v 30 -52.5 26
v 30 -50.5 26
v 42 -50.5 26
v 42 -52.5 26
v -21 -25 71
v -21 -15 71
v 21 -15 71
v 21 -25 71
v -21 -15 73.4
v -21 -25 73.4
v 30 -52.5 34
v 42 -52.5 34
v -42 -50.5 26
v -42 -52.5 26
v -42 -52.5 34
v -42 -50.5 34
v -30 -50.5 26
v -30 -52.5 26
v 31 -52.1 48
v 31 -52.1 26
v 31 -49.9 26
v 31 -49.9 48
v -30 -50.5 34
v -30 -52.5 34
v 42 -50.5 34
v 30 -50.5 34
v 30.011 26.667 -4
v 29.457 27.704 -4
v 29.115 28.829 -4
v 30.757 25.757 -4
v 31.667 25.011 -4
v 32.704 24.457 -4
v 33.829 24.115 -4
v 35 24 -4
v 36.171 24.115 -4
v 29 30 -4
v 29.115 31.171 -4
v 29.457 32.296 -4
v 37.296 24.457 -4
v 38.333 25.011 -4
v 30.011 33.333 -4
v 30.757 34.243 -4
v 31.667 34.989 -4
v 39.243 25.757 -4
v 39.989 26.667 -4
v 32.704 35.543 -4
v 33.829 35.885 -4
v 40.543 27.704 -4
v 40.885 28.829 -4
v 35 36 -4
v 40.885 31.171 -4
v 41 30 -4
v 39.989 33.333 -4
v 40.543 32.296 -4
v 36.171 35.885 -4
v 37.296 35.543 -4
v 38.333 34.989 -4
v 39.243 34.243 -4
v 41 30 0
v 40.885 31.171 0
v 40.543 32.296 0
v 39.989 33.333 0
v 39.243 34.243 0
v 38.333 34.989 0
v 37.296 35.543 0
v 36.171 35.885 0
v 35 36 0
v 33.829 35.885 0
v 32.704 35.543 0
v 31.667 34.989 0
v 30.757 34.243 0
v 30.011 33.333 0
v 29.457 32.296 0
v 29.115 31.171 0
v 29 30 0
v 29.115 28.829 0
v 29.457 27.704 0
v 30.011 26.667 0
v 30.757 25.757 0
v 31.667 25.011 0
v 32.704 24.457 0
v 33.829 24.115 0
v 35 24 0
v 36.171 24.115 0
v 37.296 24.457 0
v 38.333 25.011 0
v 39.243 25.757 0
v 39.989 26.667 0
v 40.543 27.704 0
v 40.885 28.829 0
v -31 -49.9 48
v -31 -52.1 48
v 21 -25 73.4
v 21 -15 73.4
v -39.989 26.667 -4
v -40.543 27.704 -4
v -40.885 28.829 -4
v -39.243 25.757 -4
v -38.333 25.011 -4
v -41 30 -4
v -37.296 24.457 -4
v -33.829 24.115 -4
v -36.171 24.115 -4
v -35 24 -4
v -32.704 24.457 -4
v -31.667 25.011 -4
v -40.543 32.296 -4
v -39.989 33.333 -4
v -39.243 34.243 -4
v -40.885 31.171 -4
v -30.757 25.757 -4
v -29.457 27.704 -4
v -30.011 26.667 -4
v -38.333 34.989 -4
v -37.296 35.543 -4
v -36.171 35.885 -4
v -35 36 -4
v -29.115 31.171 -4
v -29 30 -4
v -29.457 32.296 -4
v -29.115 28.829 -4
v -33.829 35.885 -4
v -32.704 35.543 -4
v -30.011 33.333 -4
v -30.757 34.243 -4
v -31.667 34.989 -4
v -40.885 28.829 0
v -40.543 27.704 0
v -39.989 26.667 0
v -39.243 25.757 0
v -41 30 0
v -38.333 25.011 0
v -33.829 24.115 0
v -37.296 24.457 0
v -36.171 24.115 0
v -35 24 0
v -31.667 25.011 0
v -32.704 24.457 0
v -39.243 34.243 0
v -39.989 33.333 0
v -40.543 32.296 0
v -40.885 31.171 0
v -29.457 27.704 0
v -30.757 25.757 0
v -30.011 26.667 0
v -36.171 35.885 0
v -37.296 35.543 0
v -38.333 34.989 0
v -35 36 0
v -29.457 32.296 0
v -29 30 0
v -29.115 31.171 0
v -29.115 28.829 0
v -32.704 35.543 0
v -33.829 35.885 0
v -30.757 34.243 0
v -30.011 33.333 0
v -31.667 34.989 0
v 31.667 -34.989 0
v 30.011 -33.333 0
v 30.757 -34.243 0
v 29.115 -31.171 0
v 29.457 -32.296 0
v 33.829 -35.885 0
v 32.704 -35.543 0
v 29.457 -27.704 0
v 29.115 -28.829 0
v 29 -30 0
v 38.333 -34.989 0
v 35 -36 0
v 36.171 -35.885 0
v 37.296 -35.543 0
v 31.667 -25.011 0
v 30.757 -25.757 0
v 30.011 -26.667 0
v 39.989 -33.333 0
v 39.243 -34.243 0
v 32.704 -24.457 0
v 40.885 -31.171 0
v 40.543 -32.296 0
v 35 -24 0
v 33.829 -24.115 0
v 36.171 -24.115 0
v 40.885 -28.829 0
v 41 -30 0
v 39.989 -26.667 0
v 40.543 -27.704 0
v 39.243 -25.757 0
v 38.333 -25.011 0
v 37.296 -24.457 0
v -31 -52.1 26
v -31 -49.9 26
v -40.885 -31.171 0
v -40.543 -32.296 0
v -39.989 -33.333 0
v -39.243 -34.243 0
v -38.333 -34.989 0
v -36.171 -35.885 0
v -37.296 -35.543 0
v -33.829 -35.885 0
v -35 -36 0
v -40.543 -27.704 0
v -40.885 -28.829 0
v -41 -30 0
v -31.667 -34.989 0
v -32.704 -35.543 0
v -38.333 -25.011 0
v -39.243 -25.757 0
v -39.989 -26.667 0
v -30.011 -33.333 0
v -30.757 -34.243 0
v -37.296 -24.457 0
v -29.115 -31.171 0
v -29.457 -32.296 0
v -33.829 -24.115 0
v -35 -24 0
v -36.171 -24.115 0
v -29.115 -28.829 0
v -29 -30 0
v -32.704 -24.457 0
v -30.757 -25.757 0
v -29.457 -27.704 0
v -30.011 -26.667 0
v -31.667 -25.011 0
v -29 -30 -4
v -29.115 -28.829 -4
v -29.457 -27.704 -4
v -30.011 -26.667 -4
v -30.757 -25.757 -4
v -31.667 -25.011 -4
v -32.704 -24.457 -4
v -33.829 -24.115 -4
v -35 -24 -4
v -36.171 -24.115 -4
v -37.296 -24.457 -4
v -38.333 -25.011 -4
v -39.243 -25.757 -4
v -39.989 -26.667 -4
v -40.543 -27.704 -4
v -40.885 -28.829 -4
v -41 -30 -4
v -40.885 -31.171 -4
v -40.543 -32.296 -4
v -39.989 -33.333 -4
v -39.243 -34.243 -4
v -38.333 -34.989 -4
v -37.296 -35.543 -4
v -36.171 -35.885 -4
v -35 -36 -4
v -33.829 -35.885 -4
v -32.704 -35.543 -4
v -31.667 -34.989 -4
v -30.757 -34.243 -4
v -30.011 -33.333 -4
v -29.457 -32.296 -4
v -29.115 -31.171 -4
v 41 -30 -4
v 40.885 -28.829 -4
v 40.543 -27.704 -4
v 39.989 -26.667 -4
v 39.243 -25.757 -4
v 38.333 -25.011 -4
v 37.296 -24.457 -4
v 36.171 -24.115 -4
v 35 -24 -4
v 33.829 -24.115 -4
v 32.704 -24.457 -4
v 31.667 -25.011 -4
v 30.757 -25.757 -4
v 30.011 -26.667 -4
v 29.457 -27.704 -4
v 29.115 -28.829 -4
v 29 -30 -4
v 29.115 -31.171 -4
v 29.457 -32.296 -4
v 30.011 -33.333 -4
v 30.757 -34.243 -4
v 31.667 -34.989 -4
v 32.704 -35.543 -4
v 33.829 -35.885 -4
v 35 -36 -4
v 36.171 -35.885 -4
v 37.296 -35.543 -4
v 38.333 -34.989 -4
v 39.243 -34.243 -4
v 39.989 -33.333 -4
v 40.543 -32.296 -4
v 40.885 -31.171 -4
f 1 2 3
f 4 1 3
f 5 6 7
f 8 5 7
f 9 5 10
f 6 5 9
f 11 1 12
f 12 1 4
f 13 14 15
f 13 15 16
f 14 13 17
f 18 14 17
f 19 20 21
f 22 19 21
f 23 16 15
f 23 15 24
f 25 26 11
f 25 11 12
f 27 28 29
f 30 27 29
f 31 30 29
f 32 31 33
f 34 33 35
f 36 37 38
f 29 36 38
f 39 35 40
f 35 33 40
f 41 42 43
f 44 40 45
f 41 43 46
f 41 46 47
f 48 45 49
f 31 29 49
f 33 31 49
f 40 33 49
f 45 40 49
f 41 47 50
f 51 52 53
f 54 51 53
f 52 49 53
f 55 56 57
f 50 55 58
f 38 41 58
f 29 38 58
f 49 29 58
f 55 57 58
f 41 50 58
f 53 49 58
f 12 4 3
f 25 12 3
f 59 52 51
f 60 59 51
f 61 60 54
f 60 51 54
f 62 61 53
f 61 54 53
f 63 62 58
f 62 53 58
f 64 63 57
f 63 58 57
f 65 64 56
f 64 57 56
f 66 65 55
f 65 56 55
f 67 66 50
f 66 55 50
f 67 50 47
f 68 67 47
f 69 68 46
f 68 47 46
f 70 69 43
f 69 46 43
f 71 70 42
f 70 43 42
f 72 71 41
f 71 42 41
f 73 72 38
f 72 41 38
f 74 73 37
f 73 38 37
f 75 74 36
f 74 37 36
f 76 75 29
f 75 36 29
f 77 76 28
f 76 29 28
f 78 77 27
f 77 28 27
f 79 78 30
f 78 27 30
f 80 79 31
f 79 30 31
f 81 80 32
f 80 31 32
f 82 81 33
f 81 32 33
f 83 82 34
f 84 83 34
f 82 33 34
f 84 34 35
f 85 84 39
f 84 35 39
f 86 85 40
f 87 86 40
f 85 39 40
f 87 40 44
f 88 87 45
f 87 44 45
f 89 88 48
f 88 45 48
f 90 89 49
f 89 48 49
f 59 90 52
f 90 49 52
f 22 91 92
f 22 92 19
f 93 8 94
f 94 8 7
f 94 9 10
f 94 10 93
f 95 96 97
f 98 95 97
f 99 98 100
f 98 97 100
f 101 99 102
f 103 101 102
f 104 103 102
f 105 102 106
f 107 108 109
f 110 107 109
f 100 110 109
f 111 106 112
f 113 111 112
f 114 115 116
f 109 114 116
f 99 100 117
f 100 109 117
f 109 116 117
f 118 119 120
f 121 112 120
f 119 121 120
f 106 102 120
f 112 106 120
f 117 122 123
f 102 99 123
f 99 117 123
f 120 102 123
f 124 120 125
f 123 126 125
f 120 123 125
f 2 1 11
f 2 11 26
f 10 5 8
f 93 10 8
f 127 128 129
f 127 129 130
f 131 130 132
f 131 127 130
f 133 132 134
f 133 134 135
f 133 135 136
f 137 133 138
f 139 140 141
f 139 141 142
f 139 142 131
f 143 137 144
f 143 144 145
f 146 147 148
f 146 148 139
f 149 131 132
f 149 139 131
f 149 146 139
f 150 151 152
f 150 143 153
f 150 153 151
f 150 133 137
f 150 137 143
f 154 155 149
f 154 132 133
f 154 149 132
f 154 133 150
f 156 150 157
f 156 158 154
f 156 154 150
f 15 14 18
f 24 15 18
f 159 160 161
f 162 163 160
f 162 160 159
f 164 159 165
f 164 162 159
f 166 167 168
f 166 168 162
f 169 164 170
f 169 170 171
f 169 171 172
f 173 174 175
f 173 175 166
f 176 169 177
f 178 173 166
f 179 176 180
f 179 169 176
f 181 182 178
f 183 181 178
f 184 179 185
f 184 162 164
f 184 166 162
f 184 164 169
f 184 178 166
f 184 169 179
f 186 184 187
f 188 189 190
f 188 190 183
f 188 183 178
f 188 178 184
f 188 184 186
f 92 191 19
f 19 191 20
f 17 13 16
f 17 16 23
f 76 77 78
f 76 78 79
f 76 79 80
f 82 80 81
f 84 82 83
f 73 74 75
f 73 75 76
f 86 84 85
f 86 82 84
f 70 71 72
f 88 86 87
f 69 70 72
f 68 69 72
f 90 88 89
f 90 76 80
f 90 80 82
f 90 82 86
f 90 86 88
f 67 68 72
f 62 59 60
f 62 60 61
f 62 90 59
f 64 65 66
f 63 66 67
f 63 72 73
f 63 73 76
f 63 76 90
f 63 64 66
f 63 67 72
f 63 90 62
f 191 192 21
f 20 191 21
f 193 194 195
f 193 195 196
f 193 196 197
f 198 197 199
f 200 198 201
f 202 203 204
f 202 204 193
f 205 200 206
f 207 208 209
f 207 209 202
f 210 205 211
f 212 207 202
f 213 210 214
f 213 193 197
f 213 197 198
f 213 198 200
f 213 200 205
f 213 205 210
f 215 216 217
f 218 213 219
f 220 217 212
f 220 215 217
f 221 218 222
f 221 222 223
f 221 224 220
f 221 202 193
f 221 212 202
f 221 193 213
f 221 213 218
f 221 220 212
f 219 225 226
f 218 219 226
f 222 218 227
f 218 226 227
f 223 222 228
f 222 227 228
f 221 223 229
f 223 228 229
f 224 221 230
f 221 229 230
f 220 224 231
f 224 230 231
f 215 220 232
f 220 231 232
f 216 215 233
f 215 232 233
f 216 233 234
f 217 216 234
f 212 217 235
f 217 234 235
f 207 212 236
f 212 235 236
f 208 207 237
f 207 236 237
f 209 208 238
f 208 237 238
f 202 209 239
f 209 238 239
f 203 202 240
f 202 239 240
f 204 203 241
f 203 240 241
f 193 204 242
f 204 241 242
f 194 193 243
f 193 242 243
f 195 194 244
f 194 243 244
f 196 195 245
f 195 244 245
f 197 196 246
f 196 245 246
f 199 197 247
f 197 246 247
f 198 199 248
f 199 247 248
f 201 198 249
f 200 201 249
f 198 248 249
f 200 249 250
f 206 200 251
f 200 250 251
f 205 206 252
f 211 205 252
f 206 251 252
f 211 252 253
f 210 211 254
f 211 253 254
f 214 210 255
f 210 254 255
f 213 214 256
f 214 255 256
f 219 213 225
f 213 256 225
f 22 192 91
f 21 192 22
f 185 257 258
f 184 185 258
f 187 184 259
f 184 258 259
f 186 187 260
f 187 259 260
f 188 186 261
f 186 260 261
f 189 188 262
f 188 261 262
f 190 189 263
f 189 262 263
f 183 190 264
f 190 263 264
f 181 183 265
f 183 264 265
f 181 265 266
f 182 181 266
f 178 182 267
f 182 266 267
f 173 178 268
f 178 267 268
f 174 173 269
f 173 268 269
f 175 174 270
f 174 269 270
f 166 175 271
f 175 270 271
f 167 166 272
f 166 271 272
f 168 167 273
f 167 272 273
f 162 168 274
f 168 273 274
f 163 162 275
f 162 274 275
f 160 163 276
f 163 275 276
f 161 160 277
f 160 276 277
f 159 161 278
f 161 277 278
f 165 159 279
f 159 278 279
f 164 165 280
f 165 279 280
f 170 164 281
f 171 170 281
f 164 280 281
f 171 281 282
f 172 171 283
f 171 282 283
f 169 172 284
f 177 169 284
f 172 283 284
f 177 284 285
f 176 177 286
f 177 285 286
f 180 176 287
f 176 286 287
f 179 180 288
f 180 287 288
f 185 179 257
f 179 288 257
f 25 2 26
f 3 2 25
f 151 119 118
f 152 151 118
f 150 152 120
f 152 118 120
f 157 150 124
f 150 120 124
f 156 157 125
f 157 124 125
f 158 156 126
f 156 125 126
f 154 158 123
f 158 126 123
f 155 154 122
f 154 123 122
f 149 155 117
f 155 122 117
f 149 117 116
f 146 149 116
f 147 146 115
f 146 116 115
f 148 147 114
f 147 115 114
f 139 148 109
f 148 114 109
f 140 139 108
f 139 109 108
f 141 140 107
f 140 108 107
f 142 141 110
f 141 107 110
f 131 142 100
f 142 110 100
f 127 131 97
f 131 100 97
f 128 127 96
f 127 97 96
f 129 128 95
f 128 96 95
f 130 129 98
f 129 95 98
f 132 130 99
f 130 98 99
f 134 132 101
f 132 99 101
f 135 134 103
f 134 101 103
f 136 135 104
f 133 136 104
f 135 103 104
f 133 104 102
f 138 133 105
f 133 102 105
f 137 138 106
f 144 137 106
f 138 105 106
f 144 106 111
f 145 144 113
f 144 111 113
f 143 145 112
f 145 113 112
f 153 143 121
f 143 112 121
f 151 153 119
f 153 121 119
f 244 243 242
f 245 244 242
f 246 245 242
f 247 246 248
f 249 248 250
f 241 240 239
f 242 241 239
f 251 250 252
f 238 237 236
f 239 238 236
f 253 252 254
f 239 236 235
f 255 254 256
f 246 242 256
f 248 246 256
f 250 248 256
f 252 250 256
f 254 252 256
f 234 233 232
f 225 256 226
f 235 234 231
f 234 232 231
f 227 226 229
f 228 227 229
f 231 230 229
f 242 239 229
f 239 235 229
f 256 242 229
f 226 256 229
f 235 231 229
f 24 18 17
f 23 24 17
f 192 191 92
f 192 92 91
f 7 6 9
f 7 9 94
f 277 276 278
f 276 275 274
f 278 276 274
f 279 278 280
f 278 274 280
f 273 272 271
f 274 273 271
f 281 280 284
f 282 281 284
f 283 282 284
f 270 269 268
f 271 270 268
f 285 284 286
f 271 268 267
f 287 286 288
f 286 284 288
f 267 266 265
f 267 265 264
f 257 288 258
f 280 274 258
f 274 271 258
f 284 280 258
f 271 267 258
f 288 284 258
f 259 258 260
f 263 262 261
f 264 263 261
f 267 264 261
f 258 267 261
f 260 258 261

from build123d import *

# Parameters (mm, degrees)
FRONT_START                                    = 26
SKETCH_1_W                                     = 62
SKETCH_1_H                                     = 2.2
FRONT_FACE_TRIM_AROUND_HC_SR04_EYE_WINDO_DEPTH = 22
TOP_START                                      = 71
SKETCH_2_W                                     = 42
SKETCH_2_H                                     = 10
TOP_TRANSLUCENT_STATUS_LIGHT_STRIP_DEPTH       = 2.4
LEFT_START                                     = 26
SKETCH_3_W                                     = 12
SKETCH_3_H                                     = 2
LEFT_CHEEK_DECORATIVE_INSERT_DEPTH             = 8
RIGHT_START                                    = 26
SKETCH_4_W                                     = 12
SKETCH_4_H                                     = 2
RIGHT_CHEEK_DECORATIVE_INSERT_DEPTH            = 8
RUBBER_START                                   = -4
SKETCH_5_R                                     = 6
RUBBER_FOOT_1_DEPTH                            = 4
SKETCH_6_R                                     = 6
RUBBER_FOOT_2_DEPTH                            = 4
SKETCH_7_R                                     = 6
RUBBER_FOOT_3_DEPTH                            = 4
SKETCH_8_R                                     = 6
RUBBER_FOOT_4_DEPTH                            = 4


with BuildPart() as part:
    # 草图1 → front face trim around HC-SR04 eye window (new body)
    with BuildSketch(Plane.XY.offset(FRONT_START)):
        with Locations((0, -51)):
            Rectangle(SKETCH_1_W, SKETCH_1_H)
    extrude(amount=FRONT_FACE_TRIM_AROUND_HC_SR04_EYE_WINDO_DEPTH)


with BuildPart() as body_2:
    # 草图2 → top translucent status light strip (new body)
    with BuildSketch(Plane.XY.offset(TOP_START)):
        with Locations((0, -20)):
            Rectangle(SKETCH_2_W, SKETCH_2_H)
    extrude(amount=TOP_TRANSLUCENT_STATUS_LIGHT_STRIP_DEPTH)


with BuildPart() as body_3:
    # 草图3 → left cheek decorative insert (new body)
    with BuildSketch(Plane.XY.offset(LEFT_START)):
        with Locations((-36, -51.5)):
            Rectangle(SKETCH_3_W, SKETCH_3_H)
    extrude(amount=LEFT_CHEEK_DECORATIVE_INSERT_DEPTH)


with BuildPart() as body_4:
    # 草图4 → right cheek decorative insert (new body)
    with BuildSketch(Plane.XY.offset(RIGHT_START)):
        with Locations((36, -51.5)):
            Rectangle(SKETCH_4_W, SKETCH_4_H)
    extrude(amount=RIGHT_CHEEK_DECORATIVE_INSERT_DEPTH)


with BuildPart() as body_5:
    # 草图5 → rubber foot 1 (new body)
    with BuildSketch(Plane.XY.offset(RUBBER_START)):
        with Locations((-35, -30)):
            Circle(SKETCH_5_R)
    extrude(amount=RUBBER_FOOT_1_DEPTH)


with BuildPart() as body_6:
    # 草图6 → rubber foot 2 (new body)
    with BuildSketch(Plane.XY.offset(RUBBER_START)):
        with Locations((35, -30)):
            Circle(SKETCH_6_R)
    extrude(amount=RUBBER_FOOT_2_DEPTH)


with BuildPart() as body_7:
    # 草图7 → rubber foot 3 (new body)
    with BuildSketch(Plane.XY.offset(RUBBER_START)):
        with Locations((-35, 30)):
            Circle(SKETCH_7_R)
    extrude(amount=RUBBER_FOOT_3_DEPTH)


with BuildPart() as body_8:
    # 草图8 → rubber foot 4 (new body)
    with BuildSketch(Plane.XY.offset(RUBBER_START)):
        with Locations((35, 30)):
            Circle(SKETCH_8_R)
    extrude(amount=RUBBER_FOOT_4_DEPTH)


solid = Compound([part.part, body_2.part, body_3.part, body_4.part, body_5.part, body_6.part, body_7.part, body_8.part])
